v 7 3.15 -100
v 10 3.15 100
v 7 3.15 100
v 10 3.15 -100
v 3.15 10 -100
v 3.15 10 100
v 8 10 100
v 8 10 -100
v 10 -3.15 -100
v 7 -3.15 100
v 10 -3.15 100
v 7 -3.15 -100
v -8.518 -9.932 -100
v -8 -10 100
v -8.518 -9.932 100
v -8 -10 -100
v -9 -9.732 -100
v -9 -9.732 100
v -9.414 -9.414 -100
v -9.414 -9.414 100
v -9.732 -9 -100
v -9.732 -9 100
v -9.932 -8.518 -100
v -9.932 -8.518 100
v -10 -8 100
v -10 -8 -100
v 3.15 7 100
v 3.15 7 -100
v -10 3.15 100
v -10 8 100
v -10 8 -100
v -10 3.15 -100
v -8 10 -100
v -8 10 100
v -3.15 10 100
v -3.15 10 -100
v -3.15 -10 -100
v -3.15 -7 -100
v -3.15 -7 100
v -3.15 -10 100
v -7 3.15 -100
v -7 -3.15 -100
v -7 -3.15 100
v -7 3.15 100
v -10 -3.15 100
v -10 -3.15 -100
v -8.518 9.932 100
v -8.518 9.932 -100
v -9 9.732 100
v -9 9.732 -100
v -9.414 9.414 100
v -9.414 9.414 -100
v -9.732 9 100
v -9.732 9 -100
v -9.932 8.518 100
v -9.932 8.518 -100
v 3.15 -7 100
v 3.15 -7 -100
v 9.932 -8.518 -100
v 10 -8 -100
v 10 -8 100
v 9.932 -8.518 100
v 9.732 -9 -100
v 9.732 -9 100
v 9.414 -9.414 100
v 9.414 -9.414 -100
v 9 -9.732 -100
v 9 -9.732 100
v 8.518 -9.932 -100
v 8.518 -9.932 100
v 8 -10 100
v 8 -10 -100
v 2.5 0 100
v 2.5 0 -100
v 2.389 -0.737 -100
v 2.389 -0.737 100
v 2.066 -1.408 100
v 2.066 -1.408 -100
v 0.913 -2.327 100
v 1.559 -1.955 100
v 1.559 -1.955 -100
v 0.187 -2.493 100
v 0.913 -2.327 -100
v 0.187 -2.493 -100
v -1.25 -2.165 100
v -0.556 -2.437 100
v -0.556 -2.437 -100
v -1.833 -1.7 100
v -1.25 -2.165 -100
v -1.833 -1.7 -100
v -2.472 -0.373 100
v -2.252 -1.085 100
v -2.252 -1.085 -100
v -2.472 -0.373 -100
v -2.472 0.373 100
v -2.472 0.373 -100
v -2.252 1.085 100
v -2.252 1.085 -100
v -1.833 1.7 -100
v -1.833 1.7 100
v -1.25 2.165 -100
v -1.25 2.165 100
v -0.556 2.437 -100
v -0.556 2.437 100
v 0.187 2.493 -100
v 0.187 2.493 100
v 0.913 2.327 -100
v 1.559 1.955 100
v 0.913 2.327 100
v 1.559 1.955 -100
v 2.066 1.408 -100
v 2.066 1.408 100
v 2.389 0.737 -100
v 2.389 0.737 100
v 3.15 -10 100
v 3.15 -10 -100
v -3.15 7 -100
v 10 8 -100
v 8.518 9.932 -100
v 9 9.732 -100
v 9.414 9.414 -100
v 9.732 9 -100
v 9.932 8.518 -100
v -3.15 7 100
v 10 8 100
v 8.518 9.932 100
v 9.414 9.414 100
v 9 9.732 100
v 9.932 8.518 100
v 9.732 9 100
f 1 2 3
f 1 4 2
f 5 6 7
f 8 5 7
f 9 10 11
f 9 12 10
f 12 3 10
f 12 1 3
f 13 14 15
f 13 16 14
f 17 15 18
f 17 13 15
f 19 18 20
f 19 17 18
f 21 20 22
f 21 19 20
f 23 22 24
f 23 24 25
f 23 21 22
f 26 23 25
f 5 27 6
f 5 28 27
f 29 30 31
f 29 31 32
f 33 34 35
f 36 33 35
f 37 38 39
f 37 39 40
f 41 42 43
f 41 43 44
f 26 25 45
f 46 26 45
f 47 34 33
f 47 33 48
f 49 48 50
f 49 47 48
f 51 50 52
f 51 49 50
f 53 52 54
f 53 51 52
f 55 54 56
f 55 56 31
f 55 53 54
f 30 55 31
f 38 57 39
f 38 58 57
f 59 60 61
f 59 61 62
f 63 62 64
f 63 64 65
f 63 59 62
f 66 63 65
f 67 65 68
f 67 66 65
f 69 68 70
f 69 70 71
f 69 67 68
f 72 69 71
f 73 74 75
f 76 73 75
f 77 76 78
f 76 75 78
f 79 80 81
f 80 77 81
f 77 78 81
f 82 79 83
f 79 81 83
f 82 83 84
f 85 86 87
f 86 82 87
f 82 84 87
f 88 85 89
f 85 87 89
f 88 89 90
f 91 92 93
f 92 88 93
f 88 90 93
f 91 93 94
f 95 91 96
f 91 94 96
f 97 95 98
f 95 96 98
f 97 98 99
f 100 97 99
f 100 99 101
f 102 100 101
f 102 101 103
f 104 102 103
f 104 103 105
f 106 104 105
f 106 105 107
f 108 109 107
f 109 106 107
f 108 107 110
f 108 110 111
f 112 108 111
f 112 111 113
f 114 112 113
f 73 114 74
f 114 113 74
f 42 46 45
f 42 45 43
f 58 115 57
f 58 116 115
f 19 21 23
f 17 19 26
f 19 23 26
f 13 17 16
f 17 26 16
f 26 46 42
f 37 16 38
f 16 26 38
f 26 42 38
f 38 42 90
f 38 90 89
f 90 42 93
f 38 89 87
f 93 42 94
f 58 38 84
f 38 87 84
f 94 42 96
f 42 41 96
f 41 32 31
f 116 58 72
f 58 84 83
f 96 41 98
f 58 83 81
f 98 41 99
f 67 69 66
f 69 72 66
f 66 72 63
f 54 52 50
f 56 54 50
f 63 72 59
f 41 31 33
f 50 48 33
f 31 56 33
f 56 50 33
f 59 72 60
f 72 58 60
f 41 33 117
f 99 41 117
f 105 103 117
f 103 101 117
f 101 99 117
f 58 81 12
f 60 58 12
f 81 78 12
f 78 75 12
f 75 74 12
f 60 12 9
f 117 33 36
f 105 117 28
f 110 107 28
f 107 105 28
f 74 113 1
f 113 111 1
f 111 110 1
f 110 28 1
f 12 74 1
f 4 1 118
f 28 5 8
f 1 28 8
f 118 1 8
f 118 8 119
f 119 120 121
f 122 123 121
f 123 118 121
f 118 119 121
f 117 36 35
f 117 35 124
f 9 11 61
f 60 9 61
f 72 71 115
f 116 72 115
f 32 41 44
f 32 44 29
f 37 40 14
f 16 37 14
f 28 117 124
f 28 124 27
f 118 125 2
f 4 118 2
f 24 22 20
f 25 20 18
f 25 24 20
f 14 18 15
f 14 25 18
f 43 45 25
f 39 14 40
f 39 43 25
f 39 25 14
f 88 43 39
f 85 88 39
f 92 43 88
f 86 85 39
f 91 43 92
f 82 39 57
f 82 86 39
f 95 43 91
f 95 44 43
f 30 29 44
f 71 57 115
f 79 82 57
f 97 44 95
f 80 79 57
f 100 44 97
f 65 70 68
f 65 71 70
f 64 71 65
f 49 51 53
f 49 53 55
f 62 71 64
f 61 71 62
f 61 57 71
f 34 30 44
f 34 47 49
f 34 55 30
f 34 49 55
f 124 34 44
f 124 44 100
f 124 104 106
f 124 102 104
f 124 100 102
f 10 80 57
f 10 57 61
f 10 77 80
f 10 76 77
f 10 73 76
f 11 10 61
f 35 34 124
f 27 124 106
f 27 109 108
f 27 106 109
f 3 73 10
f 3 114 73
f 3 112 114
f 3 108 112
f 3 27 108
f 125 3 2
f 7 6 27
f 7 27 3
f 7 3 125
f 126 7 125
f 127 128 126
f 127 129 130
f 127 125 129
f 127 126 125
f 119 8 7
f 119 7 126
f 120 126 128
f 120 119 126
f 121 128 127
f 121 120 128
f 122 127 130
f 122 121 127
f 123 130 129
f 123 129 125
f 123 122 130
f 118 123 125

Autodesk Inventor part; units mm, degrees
ref_plane "YZ Plane" through (0, 0, 0) normal (1, 0, 0) x (0, 1, 0)
ref_plane "XZ Plane" through (0, 0, 0) normal (0, 1, 0) x (-1, 0, 0)
ref_plane "XY Plane" through (0, 0, 0) normal (0, 0, 1) x (1, 0, 0)
sketch "Sketch1" plane through (0, 0, 0) normal (0, 0, 1) x (1, 0, 0)
  line L0 (-10, 10) -> (-3.15, 10)
  line L1 (-3.15, 10) -> (-3.15, 7)
  line L2 (-3.15, 7) -> (3.15, 7)
  line L3 (3.15, 7) -> (3.15, 10)
  line L4 (3.15, 10) -> (10, 10)
  line L5 (10, 10) -> (10, 3.15)
  line L6 (10, 3.15) -> (7, 3.15)
  line L7 (7, 3.15) -> (7, -3.15)
  line L8 (7, -3.15) -> (10, -3.15)
  line L9 (10, -3.15) -> (10, -10)
  line L10 (10, -10) -> (3.15, -10)
  line L11 (3.15, -10) -> (3.15, -7)
  line L12 (3.15, -7) -> (-3.15, -7)
  line L13 (-3.15, -7) -> (-3.15, -10)
  line L14 (-10, -10) -> (-10, -3.15)
  line L15 (-10, -3.15) -> (-7, -3.15)
  line L16 (-7, -3.15) -> (-7, 3.15)
  line L17 (-7, 3.15) -> (-10, 3.15)
  line L18 (-10, 10) -> (-10, 3.15)
  line L19 (-3.15, -10) -> (-10, -10)
  circle A0 centre (0, 0) radius 2.5
  point P0 (0, 7)
  point P1 (-7, 0)
  dimension "d0" = 20
  dimension "d1" = 6.3
  dimension "d2" = 3
  dimension "d3" = 5
extrude "Extrusion1" add sketch "Sketch1" along normal mid plane 200
fillet "Fillet1" radius 2 4 edges at (-10, 10, 0) (10, 10, 0) (10, -10, 0) (-10, -10, 0)
properties part number "Profil"
